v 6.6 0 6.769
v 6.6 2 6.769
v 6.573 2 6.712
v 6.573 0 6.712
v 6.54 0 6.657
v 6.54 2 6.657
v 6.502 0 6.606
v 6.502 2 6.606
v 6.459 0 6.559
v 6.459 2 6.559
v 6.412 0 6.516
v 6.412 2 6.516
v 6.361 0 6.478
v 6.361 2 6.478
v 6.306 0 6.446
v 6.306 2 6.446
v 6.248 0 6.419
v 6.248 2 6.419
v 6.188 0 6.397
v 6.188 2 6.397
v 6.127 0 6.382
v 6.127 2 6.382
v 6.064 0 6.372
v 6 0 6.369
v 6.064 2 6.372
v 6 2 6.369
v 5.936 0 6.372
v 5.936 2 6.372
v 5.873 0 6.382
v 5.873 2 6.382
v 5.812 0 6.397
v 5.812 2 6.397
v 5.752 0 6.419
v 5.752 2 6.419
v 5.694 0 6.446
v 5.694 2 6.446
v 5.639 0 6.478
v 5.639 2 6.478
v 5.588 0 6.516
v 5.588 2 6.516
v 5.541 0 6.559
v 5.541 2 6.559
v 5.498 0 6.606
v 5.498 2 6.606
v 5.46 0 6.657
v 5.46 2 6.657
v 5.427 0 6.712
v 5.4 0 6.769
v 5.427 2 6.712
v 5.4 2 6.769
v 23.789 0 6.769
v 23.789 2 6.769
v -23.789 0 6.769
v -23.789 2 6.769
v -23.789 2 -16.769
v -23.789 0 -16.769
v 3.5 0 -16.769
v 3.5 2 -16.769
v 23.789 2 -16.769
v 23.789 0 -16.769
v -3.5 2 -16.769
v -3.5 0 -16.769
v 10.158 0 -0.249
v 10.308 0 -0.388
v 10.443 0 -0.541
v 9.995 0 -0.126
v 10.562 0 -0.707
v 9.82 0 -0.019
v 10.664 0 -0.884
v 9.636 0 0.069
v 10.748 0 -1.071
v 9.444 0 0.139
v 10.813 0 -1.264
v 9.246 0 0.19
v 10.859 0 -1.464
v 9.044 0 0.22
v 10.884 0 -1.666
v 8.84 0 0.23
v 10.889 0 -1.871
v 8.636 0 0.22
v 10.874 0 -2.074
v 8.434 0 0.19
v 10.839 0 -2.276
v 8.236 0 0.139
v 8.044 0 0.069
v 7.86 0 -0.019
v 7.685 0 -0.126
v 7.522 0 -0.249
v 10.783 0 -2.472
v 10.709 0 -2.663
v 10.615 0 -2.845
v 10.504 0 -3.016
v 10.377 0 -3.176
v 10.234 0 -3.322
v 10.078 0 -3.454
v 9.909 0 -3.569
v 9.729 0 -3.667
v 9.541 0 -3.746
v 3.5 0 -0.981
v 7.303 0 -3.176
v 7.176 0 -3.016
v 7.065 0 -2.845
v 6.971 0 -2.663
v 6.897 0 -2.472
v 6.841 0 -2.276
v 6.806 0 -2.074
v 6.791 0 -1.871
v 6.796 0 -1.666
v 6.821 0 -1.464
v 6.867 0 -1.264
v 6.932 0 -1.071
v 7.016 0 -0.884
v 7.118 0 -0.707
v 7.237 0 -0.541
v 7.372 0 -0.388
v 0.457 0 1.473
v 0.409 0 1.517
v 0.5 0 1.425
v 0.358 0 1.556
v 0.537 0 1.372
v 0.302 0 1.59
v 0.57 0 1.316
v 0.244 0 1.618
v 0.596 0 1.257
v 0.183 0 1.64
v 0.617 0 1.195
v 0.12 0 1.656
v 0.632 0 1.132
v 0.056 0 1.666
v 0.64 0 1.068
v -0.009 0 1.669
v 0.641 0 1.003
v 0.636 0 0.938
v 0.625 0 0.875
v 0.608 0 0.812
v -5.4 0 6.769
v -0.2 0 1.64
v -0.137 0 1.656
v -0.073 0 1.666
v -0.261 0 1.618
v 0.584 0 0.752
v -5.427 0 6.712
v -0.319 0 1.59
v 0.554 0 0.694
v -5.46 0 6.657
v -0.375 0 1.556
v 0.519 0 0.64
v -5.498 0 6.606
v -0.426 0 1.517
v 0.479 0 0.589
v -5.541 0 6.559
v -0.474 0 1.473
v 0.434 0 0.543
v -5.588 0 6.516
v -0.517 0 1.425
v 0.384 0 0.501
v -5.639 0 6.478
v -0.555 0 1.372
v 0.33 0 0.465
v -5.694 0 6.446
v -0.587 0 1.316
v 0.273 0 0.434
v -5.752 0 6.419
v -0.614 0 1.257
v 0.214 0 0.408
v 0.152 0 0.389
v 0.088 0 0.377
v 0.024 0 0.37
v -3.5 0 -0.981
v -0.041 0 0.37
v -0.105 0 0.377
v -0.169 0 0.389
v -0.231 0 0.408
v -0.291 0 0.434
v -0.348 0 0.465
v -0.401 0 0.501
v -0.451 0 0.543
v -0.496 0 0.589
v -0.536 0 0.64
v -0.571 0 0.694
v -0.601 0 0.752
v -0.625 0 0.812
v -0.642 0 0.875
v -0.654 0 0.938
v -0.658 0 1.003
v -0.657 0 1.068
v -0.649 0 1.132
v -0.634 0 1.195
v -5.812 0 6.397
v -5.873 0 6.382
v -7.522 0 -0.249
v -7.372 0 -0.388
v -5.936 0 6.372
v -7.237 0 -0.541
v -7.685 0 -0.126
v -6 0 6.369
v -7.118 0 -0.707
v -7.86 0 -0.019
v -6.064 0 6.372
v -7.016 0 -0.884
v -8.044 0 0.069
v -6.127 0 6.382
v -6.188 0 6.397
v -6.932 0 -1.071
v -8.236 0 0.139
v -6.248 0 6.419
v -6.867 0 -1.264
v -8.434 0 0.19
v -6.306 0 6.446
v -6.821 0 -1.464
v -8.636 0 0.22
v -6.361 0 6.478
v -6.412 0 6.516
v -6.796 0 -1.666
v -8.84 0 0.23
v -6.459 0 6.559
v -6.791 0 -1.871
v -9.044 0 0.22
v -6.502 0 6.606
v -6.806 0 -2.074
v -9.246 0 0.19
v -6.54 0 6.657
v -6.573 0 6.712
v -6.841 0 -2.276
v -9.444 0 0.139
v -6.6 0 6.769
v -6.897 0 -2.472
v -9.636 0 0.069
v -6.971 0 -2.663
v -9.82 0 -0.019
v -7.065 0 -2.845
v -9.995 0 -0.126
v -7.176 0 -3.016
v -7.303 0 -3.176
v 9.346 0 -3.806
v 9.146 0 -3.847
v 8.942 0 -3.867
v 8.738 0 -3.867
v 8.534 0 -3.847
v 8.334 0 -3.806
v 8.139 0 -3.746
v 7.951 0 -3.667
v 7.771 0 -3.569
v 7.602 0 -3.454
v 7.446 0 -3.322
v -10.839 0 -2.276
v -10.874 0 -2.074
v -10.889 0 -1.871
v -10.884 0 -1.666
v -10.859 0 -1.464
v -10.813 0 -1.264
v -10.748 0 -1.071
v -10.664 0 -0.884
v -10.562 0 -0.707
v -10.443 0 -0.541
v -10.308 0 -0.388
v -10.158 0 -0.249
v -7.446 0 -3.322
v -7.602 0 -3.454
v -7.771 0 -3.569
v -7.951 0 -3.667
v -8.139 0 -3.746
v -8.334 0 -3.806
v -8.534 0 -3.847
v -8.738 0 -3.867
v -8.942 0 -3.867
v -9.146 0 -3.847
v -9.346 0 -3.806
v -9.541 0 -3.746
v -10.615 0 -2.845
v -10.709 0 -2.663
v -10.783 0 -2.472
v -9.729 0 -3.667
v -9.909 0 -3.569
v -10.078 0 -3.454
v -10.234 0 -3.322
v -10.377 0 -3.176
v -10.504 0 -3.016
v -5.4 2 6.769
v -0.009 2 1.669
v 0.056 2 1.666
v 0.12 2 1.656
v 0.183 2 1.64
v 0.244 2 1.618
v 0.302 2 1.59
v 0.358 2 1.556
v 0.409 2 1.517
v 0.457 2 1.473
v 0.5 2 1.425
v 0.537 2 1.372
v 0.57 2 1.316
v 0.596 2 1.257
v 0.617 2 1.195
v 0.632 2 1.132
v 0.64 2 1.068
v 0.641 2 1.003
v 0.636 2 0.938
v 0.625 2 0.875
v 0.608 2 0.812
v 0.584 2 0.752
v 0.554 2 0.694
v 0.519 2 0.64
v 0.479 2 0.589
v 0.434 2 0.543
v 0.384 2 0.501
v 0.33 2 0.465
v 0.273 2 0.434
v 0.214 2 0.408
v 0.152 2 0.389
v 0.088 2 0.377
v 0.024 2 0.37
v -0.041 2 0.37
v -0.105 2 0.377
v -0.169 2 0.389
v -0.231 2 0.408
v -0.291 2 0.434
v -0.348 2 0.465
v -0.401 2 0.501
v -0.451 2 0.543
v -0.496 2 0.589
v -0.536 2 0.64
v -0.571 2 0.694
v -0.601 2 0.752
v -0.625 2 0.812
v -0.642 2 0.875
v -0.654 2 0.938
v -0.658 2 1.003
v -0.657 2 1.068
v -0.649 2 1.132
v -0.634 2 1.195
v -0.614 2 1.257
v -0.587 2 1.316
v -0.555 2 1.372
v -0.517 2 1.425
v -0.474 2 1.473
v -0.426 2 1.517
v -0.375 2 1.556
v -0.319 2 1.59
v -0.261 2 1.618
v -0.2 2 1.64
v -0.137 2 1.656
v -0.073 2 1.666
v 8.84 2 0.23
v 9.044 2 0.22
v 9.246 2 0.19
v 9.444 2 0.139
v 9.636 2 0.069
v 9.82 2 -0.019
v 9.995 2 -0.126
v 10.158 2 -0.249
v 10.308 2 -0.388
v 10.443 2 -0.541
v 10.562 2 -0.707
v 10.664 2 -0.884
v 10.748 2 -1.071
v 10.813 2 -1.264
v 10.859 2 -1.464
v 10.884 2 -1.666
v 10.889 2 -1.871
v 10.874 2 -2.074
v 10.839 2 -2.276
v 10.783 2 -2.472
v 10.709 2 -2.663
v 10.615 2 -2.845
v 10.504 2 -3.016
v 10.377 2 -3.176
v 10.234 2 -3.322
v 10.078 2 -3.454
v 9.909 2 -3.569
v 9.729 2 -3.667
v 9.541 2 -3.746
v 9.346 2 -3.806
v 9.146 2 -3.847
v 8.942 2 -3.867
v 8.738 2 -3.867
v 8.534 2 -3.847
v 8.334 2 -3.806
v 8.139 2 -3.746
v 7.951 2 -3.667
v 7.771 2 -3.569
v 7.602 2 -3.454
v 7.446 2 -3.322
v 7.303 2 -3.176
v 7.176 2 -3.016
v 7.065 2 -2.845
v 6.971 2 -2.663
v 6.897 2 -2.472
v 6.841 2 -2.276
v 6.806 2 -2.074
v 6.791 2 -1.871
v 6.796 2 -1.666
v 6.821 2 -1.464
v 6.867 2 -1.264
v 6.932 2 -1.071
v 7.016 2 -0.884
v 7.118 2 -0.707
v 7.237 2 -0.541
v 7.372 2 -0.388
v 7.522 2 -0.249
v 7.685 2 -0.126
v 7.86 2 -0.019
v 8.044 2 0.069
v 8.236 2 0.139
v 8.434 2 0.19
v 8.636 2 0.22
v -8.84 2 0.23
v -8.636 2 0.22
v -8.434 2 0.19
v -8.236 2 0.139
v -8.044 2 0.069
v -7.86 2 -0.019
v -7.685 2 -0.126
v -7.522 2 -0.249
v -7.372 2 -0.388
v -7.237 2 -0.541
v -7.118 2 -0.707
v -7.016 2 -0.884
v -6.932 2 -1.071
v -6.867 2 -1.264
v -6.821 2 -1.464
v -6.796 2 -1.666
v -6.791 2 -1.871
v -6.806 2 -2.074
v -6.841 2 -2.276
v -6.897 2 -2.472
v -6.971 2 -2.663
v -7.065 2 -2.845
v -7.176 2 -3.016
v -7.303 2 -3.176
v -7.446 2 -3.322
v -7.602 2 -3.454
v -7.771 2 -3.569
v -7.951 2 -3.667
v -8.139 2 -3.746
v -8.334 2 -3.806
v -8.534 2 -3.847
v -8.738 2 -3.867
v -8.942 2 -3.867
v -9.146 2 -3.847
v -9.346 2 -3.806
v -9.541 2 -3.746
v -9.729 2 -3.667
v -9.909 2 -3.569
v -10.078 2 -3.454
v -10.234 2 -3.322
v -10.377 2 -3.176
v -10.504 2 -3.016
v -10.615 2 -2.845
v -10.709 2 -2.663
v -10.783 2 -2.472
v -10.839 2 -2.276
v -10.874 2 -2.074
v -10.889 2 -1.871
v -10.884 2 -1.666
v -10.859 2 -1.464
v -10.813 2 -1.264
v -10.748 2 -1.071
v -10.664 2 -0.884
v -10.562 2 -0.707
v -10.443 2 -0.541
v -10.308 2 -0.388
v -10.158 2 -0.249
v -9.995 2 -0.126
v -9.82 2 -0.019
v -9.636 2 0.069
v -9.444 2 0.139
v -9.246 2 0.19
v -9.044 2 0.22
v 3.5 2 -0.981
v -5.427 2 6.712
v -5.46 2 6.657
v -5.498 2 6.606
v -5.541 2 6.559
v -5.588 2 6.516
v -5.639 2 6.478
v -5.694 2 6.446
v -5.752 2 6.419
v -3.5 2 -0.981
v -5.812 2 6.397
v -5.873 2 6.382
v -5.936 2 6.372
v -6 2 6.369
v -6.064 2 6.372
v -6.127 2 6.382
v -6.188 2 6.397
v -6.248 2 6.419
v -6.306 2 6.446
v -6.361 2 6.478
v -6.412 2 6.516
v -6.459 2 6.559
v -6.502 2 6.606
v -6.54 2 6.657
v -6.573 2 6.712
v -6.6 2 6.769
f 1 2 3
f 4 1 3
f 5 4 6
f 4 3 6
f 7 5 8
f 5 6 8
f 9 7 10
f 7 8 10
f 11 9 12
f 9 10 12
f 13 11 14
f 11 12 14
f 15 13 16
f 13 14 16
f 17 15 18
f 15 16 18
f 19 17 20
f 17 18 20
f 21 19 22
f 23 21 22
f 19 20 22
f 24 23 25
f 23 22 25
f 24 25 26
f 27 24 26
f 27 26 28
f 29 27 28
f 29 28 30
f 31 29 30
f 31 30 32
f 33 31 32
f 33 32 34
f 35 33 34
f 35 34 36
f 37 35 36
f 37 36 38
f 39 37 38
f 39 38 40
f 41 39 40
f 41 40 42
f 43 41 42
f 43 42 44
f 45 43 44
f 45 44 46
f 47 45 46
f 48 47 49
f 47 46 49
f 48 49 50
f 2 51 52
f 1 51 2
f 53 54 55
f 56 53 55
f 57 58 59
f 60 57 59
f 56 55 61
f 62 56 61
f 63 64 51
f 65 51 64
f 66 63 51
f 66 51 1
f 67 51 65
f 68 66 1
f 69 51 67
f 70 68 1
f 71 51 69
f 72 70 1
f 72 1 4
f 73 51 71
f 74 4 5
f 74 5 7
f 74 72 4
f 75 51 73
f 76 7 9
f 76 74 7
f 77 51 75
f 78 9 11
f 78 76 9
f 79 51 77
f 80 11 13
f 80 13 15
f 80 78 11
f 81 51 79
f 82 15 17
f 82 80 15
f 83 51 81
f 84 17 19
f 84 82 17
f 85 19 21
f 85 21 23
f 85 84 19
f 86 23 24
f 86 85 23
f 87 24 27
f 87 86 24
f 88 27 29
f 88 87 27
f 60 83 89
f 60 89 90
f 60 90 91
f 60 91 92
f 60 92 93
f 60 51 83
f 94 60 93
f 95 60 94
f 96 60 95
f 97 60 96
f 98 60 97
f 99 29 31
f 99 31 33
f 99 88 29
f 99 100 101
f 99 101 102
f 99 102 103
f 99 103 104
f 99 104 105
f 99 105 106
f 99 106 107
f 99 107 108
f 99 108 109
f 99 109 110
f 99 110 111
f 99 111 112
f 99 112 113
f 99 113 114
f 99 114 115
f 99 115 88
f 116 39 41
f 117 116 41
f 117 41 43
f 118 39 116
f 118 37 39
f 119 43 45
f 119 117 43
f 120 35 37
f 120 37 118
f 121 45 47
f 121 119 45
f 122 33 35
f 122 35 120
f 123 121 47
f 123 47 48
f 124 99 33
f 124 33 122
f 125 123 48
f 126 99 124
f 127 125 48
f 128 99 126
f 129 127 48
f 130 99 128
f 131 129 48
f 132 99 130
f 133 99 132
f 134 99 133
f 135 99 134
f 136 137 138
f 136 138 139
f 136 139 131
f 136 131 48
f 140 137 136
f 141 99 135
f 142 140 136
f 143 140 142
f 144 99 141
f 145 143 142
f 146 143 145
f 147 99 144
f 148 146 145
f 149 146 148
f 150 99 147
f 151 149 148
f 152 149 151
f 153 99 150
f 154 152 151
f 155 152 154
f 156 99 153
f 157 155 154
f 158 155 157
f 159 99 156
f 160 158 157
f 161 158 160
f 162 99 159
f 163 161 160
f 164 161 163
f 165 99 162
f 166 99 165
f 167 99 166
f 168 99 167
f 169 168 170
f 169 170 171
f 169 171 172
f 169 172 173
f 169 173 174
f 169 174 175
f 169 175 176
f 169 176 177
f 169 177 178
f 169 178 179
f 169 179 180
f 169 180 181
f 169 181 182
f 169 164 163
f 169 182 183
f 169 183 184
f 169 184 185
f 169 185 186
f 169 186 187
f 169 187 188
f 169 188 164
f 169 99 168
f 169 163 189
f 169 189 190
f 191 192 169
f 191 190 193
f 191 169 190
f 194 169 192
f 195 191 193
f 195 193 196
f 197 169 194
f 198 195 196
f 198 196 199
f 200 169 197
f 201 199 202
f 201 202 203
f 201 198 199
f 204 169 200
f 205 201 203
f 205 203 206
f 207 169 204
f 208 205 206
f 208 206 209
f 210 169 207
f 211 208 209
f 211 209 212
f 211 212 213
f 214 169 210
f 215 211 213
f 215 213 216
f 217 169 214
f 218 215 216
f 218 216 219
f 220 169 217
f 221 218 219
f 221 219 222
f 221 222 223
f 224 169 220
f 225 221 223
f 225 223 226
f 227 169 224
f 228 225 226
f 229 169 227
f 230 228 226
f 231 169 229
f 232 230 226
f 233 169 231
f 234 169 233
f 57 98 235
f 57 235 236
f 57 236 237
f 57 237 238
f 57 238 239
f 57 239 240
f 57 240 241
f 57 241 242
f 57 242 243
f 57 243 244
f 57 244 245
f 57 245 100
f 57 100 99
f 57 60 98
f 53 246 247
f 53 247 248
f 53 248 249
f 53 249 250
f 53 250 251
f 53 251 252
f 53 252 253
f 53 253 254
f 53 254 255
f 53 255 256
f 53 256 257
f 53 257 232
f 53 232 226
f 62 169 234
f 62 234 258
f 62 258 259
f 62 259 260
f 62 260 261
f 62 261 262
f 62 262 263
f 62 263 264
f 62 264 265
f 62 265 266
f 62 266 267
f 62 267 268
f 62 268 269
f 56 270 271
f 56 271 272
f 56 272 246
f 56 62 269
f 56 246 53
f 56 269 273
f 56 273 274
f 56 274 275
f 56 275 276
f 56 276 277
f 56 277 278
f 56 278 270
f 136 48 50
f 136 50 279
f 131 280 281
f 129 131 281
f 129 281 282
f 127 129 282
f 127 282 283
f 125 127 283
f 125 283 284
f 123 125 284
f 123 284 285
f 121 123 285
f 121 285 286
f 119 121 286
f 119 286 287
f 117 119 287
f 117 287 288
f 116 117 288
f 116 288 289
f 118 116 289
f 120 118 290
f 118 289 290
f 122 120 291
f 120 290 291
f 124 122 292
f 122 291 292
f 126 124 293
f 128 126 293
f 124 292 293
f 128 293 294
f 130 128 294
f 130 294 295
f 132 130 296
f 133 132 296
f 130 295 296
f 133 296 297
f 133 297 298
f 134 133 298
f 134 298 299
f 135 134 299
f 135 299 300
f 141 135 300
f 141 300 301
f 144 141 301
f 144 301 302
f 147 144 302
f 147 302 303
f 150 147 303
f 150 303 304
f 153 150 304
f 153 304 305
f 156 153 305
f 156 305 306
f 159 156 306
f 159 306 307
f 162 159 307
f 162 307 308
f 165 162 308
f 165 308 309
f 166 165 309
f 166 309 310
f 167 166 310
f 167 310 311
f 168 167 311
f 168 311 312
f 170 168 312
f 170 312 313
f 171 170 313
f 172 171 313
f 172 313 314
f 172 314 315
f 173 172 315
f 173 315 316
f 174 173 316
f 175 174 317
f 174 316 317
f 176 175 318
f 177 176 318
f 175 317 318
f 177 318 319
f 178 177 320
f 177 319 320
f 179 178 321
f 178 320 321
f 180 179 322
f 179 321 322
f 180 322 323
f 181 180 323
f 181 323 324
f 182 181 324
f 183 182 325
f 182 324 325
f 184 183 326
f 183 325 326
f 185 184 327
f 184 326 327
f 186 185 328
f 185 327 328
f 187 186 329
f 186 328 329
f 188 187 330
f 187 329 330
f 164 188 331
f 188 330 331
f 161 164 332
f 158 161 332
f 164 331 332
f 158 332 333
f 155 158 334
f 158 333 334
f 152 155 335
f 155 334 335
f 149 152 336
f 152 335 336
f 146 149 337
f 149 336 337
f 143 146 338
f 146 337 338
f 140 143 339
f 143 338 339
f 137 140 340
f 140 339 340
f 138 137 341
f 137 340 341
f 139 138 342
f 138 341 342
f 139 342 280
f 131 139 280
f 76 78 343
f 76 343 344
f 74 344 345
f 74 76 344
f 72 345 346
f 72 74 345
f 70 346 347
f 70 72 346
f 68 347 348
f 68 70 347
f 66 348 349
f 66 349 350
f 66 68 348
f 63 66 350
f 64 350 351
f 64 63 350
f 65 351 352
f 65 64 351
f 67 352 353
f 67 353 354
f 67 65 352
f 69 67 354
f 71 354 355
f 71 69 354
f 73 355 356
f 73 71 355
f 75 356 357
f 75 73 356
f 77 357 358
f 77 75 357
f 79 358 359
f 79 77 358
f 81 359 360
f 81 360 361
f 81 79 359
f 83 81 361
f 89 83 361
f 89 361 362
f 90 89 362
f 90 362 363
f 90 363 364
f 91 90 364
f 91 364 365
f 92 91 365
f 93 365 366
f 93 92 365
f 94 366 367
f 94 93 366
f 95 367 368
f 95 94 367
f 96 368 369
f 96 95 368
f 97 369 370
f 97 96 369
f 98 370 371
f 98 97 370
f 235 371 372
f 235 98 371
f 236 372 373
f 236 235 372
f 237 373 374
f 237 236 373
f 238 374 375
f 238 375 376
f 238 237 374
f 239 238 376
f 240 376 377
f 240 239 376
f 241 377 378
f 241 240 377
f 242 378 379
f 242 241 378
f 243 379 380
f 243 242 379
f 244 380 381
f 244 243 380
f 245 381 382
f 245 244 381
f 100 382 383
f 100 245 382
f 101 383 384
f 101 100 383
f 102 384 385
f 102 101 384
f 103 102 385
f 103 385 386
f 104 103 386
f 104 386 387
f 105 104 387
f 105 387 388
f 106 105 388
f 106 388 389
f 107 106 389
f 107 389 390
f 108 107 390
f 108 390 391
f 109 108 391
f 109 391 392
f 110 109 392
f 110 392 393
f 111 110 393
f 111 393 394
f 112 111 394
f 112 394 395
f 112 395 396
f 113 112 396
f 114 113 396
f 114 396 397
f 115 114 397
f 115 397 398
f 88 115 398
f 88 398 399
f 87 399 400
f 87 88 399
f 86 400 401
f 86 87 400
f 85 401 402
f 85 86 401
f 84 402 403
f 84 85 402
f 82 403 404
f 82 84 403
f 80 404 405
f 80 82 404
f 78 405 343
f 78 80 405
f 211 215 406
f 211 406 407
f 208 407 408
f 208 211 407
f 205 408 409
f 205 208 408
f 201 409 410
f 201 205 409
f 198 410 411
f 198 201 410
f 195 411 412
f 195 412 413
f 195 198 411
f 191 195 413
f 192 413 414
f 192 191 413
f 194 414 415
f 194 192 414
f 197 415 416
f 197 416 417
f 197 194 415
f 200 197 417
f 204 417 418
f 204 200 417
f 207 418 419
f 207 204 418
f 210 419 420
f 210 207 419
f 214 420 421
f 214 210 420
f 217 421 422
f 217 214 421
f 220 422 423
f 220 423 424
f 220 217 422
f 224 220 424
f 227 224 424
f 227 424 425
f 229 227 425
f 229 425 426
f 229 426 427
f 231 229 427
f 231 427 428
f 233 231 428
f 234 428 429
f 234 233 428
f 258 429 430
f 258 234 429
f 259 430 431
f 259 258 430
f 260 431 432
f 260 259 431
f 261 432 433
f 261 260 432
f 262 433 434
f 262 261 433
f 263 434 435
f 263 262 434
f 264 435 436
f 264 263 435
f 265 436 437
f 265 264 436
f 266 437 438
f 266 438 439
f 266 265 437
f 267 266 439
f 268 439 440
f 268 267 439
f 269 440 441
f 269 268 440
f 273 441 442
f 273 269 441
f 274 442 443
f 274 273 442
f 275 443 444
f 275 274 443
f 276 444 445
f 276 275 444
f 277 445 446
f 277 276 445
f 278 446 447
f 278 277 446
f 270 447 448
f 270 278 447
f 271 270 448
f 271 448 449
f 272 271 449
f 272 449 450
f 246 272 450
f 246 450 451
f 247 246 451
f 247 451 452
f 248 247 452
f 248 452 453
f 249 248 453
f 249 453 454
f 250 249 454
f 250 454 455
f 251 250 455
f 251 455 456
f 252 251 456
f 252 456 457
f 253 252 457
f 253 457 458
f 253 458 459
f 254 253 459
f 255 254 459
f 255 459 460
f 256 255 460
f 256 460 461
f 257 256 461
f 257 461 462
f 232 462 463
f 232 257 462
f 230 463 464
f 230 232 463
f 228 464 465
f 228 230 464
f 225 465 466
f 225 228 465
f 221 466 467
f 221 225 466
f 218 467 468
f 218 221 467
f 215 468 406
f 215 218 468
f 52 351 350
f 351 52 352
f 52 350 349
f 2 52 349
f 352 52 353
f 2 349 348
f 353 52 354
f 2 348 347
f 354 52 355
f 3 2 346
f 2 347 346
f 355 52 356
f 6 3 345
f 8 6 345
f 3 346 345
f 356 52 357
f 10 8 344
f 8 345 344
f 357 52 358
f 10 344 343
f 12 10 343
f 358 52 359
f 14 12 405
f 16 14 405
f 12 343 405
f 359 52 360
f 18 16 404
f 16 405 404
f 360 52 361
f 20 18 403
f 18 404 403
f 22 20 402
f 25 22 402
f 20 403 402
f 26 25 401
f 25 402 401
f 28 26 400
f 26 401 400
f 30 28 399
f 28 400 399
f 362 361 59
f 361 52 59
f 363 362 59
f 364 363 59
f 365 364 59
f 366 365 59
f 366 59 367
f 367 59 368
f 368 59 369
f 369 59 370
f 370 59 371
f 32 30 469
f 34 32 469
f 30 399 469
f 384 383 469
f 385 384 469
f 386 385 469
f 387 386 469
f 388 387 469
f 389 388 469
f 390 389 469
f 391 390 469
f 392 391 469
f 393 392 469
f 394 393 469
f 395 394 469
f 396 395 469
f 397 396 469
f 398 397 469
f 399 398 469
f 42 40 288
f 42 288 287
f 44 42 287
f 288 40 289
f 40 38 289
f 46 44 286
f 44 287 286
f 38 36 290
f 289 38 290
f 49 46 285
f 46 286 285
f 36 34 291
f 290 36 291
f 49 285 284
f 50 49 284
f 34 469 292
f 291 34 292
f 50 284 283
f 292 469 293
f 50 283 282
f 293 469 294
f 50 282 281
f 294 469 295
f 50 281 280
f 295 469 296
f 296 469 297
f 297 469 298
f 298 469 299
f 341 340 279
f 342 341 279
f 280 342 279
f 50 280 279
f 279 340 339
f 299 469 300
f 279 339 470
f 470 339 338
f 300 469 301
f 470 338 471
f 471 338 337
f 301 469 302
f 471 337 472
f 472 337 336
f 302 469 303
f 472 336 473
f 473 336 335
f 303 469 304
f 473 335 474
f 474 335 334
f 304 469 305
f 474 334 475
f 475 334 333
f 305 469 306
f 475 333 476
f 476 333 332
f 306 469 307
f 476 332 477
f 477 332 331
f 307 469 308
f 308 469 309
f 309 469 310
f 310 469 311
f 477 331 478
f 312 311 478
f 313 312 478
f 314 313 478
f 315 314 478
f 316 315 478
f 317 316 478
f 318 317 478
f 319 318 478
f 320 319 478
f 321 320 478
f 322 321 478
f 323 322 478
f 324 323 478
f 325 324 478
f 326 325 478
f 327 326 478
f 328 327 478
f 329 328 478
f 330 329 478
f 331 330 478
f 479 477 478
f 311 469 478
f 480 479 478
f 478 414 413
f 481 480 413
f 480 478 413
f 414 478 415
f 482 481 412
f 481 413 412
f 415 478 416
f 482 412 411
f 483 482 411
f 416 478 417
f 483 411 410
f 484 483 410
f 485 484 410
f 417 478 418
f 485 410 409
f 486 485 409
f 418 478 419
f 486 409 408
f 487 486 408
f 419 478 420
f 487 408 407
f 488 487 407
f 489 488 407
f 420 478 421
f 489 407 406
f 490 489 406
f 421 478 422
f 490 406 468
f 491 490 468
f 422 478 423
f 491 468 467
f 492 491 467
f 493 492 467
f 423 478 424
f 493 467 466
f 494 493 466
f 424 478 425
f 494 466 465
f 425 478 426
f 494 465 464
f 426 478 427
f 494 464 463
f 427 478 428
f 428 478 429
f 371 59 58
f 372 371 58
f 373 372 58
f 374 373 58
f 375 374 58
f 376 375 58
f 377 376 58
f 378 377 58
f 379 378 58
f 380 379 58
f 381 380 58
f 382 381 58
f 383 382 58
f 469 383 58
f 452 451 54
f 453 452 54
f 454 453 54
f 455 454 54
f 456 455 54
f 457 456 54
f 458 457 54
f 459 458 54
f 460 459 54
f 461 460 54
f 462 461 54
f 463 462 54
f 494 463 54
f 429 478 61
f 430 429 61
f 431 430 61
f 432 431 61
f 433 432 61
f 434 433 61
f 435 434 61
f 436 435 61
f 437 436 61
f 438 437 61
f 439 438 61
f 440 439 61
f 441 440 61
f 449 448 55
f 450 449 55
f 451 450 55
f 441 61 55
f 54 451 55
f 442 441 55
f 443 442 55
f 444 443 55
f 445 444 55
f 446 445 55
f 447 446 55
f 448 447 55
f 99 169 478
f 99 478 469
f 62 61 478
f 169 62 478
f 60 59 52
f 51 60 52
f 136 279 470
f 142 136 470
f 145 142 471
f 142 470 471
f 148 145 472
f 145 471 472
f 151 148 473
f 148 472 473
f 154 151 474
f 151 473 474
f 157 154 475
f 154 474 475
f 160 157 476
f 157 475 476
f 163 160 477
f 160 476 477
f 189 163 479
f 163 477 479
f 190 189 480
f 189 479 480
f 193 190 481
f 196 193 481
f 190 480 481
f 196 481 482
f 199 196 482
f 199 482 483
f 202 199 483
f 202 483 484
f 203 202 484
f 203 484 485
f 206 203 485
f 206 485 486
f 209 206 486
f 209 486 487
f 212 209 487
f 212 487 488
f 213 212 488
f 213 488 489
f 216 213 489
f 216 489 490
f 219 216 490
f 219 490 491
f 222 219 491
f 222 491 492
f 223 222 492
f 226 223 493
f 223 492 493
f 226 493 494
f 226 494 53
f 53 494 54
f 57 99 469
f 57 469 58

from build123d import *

# Parameters (mm, degrees)
SKETCH1_R           = 2.05
BOSS_EXTRUDE1_DEPTH = 2
SKETCH3_R           = 0.65
CUT_EXTRUDE1_DEPTH  = 16.490262281
SKETCH4_R           = 0.65
CUT_EXTRUDE2_DEPTH  = 16.490262281
BOSS_EXTRUDE2_DEPTH = 2


with BuildPart() as part:
    # Sketch1 → Boss-Extrude1 (new body)
    with BuildSketch(Plane(origin=(0, 0, 0), x_dir=(1, 0, 0), z_dir=(0, 1, 0))):
        Polygon((-3.5, 6.76929), (-3.5, 0.98071), (3.5, 0.98071), (3.5, 6.76929), (13.78858, 6.76929), (13.78858, -6.76929), (-13.78858, -6.76929), (-13.78858, 6.76929), align=None)
        with Locations(Location((-8.84, 1.81955, 0), (0, 0, 270))):
            Circle(SKETCH1_R, mode=Mode.SUBTRACT)
        with Locations(Location((8.84, 1.81955, 0), (0, 0, 270))):
            Circle(SKETCH1_R, mode=Mode.SUBTRACT)
    extrude(amount=BOSS_EXTRUDE1_DEPTH)

    # Sketch3 → Cut-Extrude1 (cut, through all)
    with BuildSketch(Plane(origin=(0, 2, 0), x_dir=(1, 0, 0), z_dir=(0, 1, 0))):
        with Locations(Location((-0.00858, -1.01929, 0), (0, 0, 270))):
            Circle(SKETCH3_R)
    extrude(amount=-CUT_EXTRUDE1_DEPTH, mode=Mode.SUBTRACT)

    # Sketch4 → Cut-Extrude2 (cut, through all)
    with BuildSketch(Plane(origin=(0, 2, 0), x_dir=(1, 0, 0), z_dir=(0, 1, 0))):
        with Locations((6, -7.01929)):
            Circle(SKETCH4_R)
        with Locations((-6, -7.01929)):
            Circle(SKETCH4_R)
    extrude(amount=-CUT_EXTRUDE2_DEPTH, mode=Mode.SUBTRACT)

    # Sketch5 → Boss-Extrude2 (add)
    with BuildSketch(Plane(origin=(0, 2, 0), x_dir=(1, 0, 0), z_dir=(0, 1, 0))):
        Polygon((-13.78858, -6.76929), (-23.78858, -6.76929), (-23.78858, 16.76929), (-3.5, 16.76929), (-3.5, 6.76929), (-13.78858, 6.76929), align=None)
        Polygon((3.5, 6.76929), (3.5, 16.76929), (23.78858, 16.76929), (23.78858, -6.76929), (13.78858, -6.76929), (13.78858, 6.76929), align=None)
    extrude(amount=-BOSS_EXTRUDE2_DEPTH)


solid = part.part
